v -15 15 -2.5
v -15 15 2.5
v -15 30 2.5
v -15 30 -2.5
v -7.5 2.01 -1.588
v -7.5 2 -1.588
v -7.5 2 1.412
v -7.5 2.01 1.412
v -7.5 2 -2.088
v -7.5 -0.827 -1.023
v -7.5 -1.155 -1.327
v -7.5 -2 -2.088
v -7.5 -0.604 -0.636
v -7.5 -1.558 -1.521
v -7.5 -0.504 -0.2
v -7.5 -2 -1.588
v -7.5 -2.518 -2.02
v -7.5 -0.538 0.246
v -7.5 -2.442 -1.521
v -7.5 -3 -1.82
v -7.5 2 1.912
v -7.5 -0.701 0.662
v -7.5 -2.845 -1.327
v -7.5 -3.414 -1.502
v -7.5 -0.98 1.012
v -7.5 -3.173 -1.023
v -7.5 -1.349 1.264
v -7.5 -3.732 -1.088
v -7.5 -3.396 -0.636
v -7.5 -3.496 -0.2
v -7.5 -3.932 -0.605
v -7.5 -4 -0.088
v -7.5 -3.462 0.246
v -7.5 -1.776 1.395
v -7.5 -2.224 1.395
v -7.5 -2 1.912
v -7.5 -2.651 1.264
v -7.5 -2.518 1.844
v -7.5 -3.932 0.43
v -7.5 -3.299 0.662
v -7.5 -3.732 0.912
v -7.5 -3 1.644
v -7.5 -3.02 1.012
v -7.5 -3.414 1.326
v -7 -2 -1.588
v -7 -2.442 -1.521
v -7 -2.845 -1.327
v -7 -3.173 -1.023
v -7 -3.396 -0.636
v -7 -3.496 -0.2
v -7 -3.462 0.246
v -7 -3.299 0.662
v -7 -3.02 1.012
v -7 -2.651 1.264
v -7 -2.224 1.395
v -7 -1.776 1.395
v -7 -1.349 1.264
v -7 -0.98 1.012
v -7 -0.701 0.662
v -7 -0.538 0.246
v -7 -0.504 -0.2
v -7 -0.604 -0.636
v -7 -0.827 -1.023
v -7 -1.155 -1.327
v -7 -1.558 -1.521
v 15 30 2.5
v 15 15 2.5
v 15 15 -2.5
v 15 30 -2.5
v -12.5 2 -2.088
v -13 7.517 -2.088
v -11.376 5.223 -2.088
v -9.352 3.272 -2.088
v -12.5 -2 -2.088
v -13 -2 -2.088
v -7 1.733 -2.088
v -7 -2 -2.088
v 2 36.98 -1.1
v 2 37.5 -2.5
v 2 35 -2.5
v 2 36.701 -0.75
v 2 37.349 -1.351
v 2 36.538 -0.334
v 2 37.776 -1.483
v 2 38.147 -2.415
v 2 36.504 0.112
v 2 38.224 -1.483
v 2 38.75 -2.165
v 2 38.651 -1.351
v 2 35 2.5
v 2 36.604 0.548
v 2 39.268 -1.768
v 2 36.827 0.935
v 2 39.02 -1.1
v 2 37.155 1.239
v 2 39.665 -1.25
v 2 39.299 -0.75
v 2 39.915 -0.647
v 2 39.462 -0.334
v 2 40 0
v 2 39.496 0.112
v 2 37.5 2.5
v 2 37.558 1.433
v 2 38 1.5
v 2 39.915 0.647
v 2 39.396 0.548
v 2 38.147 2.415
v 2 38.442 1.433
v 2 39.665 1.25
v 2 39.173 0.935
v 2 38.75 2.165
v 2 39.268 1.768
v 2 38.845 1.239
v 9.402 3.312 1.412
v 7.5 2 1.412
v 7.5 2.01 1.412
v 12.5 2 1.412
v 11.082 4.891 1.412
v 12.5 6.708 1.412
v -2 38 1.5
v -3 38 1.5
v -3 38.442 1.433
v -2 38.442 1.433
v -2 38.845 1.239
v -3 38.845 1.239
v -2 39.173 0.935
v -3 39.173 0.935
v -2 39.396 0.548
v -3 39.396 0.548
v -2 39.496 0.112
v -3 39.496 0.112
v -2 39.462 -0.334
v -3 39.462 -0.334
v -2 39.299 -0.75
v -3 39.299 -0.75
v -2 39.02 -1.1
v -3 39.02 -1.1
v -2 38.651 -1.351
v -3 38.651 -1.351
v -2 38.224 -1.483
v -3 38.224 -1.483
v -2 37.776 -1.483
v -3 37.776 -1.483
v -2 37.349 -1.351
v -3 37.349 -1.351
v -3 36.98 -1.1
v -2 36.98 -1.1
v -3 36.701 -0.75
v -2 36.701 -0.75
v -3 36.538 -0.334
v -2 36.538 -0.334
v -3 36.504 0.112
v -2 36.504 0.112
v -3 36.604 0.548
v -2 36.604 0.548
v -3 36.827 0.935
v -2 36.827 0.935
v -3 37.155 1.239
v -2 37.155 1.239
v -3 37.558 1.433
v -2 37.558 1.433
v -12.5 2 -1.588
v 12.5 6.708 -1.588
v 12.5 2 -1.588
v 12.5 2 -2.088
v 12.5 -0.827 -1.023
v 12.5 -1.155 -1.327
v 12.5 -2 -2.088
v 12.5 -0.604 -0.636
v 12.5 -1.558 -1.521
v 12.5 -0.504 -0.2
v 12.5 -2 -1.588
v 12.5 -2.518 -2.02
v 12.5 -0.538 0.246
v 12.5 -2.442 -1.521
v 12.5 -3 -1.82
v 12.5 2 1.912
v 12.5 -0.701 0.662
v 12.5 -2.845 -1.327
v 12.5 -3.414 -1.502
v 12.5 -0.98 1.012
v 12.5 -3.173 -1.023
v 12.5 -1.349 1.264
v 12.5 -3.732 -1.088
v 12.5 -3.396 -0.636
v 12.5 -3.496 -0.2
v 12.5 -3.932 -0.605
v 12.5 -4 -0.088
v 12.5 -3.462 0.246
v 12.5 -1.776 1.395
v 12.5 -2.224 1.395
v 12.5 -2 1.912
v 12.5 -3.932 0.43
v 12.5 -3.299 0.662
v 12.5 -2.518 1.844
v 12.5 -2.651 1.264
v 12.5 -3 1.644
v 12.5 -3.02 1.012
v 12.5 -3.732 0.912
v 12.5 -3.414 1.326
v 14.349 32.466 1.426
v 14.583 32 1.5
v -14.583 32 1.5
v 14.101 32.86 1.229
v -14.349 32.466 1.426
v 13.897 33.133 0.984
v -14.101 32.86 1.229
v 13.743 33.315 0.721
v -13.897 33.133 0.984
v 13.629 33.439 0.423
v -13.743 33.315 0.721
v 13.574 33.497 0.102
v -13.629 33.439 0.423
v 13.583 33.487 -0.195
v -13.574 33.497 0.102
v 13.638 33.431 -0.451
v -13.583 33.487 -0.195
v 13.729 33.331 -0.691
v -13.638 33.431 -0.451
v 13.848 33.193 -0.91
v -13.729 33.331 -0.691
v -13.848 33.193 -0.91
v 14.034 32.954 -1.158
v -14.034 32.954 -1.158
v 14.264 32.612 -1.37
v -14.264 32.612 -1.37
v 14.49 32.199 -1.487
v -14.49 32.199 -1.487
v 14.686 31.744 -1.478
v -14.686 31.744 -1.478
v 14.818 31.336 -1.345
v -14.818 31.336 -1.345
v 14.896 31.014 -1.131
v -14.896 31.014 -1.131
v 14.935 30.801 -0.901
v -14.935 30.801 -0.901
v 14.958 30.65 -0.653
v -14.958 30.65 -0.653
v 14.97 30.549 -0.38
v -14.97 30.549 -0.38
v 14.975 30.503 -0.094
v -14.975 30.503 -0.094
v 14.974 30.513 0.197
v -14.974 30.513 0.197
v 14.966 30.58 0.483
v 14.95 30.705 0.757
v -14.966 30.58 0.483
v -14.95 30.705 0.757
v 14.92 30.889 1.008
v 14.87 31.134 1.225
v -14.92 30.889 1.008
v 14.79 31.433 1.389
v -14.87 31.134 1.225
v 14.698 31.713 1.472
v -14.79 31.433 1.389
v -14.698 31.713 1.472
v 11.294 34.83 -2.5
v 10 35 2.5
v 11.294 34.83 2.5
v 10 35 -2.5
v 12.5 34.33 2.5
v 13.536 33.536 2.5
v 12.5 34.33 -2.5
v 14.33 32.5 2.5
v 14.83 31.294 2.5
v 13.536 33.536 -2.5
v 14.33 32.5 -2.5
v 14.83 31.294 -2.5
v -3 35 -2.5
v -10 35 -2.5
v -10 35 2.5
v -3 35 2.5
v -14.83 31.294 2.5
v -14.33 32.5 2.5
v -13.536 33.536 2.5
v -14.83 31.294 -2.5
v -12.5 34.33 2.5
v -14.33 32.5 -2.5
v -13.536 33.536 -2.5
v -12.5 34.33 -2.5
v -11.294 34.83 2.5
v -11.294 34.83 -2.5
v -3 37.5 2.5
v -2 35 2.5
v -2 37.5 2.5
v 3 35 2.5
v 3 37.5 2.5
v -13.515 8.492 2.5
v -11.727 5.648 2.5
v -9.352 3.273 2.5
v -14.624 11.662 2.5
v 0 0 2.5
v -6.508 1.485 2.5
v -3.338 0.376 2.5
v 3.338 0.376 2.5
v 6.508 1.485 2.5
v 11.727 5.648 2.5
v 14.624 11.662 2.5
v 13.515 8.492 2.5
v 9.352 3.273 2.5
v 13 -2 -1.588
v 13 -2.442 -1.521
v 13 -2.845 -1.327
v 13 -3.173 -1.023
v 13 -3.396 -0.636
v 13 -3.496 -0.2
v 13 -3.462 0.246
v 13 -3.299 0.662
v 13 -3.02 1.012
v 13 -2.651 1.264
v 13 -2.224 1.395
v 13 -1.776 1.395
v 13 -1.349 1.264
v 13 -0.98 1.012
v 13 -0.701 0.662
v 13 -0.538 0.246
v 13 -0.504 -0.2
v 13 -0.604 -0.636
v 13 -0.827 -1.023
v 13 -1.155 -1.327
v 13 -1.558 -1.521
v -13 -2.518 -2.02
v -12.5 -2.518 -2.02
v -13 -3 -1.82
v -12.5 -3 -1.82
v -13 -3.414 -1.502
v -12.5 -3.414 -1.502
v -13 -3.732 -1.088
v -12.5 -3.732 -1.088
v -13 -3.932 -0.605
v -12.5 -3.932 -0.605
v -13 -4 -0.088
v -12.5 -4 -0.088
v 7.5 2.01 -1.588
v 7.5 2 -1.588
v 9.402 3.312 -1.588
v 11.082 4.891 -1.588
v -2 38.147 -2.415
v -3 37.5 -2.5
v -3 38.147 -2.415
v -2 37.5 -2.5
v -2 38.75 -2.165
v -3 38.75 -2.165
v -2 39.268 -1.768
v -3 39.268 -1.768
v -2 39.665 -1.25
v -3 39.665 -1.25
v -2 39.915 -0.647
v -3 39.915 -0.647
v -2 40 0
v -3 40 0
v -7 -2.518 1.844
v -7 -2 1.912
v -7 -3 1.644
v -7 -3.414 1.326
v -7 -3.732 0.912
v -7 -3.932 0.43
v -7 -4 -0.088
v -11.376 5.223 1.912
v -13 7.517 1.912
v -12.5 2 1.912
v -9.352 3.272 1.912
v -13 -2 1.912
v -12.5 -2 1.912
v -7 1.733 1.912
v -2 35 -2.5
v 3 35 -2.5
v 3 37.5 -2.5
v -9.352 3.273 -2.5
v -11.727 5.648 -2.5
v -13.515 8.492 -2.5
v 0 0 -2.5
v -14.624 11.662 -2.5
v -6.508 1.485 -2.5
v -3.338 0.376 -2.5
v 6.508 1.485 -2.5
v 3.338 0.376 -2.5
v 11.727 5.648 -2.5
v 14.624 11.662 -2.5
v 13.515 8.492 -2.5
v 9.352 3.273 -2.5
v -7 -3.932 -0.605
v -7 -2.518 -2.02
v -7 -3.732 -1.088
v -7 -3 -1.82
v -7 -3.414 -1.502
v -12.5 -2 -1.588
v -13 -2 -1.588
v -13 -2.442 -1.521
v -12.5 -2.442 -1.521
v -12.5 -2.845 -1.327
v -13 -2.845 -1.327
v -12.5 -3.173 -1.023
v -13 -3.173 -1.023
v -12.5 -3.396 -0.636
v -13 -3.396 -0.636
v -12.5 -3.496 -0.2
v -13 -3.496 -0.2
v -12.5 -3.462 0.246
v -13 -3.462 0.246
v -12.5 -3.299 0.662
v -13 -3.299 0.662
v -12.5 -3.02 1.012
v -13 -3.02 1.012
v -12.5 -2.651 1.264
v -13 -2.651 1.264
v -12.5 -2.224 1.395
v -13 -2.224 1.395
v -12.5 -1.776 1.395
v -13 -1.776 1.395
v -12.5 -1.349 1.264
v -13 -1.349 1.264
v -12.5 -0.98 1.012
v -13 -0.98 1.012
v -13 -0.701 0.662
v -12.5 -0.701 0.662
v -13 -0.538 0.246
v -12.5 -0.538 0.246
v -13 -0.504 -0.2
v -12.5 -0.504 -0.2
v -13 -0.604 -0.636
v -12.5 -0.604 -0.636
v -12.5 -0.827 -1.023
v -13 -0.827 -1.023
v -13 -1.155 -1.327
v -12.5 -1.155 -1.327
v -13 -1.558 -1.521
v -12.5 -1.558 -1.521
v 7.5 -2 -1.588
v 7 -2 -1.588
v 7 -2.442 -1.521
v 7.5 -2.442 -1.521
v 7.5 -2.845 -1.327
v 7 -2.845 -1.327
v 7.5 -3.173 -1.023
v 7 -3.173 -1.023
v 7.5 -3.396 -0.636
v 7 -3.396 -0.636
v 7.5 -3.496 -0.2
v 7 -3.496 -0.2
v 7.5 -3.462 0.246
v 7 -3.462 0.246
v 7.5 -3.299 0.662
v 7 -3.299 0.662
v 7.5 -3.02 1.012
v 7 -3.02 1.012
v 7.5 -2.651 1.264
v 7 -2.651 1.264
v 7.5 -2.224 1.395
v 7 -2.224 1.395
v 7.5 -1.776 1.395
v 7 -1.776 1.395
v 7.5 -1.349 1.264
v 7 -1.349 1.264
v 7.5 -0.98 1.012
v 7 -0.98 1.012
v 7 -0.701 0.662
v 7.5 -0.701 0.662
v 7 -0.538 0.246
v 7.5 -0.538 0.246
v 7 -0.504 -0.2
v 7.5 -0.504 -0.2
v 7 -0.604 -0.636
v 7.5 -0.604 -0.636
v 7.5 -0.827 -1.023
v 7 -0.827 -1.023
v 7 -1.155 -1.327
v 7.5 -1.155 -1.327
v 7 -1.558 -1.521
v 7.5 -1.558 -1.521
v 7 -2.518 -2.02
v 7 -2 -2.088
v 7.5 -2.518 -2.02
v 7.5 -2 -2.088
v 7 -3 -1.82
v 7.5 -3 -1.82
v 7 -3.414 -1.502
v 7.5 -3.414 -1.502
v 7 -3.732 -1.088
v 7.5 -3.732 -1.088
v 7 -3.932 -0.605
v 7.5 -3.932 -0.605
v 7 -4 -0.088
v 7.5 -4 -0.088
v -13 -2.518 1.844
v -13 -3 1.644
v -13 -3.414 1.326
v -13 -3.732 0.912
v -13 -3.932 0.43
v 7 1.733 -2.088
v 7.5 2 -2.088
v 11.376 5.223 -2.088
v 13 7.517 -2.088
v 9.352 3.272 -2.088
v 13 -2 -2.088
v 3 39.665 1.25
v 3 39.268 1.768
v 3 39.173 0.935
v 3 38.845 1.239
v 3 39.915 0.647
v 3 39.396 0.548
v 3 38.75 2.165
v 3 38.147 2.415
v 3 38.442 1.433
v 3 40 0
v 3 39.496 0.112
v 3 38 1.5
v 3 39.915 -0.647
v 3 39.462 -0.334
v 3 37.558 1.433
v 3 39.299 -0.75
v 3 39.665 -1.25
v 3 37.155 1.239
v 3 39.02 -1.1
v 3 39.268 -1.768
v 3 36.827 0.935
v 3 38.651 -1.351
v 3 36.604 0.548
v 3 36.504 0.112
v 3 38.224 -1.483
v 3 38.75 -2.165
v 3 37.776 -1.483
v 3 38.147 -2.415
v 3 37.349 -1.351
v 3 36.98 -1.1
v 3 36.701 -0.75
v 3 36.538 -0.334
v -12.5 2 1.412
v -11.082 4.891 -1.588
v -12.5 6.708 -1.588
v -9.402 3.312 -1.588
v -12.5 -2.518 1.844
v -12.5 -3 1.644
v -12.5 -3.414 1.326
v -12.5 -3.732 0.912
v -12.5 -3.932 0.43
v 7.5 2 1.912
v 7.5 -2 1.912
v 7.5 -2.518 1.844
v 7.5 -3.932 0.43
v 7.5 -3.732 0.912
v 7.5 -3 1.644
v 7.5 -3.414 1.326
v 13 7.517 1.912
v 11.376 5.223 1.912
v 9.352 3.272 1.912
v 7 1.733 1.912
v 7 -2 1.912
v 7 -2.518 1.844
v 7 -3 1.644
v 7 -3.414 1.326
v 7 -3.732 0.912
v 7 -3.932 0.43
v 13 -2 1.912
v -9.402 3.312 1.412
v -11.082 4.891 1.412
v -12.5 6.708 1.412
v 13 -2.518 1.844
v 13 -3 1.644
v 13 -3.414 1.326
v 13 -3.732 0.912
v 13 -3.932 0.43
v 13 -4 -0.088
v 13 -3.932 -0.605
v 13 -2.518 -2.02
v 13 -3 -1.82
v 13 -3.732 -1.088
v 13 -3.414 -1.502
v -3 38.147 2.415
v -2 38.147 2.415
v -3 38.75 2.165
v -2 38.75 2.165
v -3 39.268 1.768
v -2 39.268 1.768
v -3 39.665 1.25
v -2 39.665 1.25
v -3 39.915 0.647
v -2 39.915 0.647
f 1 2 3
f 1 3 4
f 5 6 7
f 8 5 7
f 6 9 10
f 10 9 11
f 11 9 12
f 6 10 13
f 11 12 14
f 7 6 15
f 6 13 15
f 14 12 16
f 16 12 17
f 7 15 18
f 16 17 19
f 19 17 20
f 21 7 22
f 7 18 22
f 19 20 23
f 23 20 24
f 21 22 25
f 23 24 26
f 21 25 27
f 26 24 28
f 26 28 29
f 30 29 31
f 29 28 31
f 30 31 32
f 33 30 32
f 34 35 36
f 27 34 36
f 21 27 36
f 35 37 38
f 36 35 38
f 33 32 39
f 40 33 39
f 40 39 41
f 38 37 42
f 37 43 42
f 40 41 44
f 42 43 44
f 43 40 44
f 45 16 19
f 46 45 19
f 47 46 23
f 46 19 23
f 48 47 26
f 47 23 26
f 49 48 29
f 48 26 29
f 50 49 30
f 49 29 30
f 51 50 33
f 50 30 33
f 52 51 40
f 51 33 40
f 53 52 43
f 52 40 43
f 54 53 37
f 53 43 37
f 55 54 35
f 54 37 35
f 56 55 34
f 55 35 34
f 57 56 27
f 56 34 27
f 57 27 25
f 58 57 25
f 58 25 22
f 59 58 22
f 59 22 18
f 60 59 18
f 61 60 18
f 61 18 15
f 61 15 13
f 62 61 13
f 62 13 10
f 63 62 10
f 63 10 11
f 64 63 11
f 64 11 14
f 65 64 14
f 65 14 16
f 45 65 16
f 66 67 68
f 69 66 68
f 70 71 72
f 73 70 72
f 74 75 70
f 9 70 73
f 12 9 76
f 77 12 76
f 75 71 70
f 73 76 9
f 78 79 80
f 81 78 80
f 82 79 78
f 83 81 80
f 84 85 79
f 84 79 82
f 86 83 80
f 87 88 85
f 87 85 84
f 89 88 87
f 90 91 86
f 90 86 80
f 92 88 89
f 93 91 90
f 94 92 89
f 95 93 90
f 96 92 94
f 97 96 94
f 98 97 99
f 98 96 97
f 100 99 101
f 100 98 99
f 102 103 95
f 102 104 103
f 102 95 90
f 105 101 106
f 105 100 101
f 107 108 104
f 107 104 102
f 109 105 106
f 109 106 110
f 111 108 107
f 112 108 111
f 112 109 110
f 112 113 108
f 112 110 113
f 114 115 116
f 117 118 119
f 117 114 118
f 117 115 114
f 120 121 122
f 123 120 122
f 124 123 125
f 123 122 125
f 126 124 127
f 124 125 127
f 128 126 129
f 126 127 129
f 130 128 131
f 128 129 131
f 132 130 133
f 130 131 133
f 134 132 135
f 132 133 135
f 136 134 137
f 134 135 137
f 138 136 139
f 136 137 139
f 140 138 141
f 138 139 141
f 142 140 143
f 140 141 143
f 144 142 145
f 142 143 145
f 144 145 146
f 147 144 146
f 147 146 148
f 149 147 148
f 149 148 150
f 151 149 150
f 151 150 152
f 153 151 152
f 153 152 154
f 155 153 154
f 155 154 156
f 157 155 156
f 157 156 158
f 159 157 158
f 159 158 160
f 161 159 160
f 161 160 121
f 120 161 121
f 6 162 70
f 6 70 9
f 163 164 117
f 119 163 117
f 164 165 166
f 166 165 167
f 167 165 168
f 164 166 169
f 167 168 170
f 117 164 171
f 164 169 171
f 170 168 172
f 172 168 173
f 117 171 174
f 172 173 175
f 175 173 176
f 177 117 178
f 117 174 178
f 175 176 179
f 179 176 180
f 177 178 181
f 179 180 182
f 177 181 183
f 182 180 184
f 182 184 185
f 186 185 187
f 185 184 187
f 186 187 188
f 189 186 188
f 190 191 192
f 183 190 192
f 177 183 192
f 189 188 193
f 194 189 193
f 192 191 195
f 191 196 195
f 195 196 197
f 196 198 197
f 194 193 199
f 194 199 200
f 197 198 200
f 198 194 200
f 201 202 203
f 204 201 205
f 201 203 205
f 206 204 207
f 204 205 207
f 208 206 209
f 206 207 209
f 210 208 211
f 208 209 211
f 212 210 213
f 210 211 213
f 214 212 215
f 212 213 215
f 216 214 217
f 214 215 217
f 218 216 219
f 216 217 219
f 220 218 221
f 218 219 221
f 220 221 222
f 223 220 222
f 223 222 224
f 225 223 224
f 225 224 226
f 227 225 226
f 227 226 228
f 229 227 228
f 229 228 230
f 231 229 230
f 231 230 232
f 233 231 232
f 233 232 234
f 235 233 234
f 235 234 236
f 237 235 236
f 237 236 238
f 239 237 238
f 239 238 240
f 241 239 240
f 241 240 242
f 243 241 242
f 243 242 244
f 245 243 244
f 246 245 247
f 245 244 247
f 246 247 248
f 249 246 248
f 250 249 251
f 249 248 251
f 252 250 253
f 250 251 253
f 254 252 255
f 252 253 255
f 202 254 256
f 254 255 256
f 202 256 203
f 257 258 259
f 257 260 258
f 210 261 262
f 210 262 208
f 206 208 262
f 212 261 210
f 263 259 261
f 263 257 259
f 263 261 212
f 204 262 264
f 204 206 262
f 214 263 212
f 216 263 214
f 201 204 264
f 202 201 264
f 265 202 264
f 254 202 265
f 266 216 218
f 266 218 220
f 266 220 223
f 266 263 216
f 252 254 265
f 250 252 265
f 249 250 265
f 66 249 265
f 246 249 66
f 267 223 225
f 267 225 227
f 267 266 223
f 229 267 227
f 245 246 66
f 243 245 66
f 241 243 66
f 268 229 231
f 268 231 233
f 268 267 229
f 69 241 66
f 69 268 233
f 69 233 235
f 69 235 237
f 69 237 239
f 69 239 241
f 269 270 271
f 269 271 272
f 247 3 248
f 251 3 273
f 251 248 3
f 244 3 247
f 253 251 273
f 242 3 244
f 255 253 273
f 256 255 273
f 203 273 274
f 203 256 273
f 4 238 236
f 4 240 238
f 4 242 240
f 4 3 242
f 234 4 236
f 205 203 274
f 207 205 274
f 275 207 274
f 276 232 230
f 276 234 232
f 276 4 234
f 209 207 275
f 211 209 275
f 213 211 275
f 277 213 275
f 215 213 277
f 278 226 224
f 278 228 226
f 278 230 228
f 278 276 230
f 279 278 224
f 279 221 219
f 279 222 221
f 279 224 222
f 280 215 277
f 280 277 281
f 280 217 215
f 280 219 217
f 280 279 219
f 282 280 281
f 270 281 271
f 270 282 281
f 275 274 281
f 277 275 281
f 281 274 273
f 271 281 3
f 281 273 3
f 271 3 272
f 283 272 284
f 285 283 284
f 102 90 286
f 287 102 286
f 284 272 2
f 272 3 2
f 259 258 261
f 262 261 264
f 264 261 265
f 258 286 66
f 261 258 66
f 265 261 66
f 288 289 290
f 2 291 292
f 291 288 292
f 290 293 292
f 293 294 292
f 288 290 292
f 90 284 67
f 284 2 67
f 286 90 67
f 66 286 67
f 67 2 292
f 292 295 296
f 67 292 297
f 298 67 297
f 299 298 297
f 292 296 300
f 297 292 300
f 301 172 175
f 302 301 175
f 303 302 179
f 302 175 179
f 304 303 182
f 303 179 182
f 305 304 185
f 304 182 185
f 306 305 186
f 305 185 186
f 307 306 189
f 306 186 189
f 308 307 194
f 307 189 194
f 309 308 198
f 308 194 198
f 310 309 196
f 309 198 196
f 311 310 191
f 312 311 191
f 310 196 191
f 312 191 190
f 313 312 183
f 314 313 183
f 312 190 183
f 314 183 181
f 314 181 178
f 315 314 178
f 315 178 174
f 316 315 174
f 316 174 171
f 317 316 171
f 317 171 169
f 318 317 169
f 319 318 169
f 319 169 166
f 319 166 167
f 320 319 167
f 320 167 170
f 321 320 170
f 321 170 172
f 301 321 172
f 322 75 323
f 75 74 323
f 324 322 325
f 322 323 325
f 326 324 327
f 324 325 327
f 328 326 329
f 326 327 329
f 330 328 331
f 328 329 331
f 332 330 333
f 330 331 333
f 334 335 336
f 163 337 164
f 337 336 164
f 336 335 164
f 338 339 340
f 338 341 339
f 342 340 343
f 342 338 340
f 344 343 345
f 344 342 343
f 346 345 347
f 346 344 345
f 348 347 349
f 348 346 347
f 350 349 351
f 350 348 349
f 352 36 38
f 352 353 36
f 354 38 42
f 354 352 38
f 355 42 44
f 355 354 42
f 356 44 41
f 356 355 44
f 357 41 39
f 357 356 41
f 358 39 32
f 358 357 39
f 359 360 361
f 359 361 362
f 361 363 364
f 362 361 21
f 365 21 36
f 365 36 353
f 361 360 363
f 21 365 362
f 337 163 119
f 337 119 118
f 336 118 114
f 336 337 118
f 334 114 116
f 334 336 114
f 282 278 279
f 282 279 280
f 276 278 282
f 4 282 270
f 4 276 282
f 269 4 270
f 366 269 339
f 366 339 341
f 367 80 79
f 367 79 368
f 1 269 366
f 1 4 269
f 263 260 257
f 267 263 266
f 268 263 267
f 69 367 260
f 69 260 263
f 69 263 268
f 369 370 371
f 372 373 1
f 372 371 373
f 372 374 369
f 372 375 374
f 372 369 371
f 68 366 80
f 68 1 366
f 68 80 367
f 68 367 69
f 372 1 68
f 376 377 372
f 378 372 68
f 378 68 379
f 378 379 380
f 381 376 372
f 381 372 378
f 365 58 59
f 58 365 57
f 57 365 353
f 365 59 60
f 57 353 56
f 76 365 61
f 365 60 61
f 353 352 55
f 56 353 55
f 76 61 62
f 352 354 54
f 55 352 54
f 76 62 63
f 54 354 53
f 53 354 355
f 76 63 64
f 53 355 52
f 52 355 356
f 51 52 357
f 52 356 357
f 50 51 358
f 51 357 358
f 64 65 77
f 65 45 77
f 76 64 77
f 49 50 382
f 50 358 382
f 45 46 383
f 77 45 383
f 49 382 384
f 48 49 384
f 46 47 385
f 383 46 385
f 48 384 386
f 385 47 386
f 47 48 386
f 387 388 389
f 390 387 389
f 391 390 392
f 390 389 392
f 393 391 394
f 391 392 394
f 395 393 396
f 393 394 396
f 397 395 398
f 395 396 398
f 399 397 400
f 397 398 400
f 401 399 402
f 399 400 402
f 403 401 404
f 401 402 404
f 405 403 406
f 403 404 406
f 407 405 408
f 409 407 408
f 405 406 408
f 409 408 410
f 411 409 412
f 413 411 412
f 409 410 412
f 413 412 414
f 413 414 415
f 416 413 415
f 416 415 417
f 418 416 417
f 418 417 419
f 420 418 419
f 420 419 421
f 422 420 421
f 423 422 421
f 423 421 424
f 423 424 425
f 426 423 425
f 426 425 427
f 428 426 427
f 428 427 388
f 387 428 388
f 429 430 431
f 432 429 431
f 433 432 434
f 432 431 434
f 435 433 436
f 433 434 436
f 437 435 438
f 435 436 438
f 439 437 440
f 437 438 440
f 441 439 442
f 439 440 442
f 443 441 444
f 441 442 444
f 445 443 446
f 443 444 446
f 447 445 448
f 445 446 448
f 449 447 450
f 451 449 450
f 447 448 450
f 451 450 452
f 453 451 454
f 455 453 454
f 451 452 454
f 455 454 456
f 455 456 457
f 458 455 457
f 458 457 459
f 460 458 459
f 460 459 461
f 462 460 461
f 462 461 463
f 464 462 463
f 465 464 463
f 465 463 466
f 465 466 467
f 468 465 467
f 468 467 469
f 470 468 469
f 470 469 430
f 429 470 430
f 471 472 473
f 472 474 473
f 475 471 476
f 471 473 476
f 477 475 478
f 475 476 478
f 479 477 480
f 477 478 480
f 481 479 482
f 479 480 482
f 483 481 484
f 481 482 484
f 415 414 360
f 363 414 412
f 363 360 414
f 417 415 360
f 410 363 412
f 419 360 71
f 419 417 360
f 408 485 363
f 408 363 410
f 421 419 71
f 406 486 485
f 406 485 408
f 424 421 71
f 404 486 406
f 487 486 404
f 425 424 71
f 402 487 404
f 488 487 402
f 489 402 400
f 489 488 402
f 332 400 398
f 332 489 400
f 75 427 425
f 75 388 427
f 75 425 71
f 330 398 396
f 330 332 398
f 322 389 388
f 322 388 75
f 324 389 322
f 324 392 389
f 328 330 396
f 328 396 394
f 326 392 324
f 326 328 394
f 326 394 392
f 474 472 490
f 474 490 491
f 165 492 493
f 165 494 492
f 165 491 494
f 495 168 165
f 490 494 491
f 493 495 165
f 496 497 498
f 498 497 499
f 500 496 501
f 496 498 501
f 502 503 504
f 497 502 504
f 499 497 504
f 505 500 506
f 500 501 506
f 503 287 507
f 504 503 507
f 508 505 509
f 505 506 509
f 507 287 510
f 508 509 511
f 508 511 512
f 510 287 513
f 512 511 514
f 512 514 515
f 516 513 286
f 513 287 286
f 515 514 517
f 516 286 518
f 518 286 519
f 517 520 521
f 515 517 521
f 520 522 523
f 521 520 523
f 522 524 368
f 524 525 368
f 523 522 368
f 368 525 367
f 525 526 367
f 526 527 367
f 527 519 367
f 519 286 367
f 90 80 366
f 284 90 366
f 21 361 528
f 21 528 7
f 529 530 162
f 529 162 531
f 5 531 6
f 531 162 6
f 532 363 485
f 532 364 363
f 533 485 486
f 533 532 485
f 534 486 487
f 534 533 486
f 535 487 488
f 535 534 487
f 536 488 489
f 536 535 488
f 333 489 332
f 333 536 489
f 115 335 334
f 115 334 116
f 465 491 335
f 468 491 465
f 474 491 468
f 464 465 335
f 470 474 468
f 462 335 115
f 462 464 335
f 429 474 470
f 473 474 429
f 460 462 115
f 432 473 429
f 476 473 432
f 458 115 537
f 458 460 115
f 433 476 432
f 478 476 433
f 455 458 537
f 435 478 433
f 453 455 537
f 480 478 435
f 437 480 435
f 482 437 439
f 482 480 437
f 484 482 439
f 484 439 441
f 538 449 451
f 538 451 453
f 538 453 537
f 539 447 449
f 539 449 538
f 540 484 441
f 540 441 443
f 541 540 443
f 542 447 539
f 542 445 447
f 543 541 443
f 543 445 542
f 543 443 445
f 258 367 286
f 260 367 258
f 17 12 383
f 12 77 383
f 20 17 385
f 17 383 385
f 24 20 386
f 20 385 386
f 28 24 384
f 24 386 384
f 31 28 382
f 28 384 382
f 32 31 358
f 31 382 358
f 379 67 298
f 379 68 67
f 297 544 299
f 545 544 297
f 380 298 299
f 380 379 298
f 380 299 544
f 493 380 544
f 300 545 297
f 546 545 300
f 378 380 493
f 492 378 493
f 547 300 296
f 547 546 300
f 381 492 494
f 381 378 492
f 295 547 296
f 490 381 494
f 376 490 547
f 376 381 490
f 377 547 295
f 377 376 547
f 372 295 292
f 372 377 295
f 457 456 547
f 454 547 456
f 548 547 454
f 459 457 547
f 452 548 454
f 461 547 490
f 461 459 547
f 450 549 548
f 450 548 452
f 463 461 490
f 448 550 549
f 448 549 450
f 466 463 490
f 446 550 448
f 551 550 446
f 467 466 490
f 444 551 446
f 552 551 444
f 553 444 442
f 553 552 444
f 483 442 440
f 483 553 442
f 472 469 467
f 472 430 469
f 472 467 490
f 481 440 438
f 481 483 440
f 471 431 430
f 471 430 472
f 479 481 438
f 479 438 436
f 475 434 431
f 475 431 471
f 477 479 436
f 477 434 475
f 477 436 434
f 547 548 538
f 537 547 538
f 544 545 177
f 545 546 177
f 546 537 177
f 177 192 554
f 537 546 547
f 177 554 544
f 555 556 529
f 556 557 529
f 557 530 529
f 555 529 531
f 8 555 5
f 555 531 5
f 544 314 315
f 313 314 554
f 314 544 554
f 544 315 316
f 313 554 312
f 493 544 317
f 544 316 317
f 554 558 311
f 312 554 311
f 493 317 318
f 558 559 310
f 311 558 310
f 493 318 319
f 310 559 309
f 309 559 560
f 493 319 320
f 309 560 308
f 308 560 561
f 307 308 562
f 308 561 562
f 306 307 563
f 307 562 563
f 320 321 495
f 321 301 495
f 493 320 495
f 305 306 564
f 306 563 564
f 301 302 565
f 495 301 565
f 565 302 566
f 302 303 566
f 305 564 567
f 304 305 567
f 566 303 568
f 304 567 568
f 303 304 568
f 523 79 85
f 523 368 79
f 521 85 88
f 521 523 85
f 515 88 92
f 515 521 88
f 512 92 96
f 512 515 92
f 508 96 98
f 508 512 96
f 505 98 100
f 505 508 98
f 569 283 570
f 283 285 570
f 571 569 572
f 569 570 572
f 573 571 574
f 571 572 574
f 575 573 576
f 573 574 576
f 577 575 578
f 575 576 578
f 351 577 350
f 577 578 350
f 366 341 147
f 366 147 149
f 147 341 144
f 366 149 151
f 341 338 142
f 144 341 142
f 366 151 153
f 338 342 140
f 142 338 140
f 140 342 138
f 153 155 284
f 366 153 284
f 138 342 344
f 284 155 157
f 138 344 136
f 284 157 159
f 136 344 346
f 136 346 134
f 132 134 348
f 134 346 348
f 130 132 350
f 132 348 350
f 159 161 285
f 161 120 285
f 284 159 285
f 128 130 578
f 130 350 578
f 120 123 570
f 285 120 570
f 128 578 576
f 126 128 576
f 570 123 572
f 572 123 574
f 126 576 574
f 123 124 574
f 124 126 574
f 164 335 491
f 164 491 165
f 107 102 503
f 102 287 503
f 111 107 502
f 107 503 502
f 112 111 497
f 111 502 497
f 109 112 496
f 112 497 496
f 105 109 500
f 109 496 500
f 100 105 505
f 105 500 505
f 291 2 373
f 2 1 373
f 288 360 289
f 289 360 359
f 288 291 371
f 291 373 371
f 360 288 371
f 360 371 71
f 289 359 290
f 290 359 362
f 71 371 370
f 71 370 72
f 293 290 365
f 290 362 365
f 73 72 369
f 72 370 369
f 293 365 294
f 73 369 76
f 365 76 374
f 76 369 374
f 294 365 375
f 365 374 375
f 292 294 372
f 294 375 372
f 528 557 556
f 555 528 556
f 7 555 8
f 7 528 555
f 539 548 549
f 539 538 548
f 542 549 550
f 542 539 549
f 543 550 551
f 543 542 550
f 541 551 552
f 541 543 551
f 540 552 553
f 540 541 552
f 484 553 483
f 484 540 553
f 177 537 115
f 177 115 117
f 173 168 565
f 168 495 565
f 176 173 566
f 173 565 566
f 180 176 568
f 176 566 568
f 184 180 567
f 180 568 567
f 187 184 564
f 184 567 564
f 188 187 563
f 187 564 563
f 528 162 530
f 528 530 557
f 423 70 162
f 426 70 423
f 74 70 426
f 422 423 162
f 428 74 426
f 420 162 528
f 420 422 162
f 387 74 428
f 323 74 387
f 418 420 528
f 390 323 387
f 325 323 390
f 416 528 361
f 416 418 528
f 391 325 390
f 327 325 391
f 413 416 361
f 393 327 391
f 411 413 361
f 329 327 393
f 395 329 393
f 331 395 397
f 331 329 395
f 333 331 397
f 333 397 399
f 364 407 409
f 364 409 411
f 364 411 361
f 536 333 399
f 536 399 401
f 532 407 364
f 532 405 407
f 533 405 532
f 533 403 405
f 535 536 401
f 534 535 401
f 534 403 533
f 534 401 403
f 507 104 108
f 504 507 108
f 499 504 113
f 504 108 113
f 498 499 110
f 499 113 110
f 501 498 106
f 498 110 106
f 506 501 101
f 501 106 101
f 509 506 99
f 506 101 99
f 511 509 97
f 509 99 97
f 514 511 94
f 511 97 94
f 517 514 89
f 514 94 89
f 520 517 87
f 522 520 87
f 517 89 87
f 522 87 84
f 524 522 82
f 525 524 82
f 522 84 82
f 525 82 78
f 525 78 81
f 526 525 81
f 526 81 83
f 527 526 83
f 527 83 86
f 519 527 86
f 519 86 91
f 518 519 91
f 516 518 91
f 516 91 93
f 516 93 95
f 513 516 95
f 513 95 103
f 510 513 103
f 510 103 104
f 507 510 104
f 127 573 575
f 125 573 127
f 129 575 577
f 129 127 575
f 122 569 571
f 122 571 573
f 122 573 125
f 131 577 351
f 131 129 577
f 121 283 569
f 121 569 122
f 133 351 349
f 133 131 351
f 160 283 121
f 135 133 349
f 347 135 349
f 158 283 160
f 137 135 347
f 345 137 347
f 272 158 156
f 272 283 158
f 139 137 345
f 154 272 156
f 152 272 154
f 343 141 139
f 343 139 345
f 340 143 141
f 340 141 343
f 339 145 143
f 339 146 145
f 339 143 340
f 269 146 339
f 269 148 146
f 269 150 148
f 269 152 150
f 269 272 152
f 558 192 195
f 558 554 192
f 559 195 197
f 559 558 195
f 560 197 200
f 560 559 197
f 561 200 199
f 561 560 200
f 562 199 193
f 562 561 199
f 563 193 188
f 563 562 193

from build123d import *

# Parameters (mm, degrees)
SKETCH1_W                = 30
SKETCH1_H                = 5
BOSS_EXTRUDE1_DEPTH      = 35
FILLET1_R                = 15
FILLET3_R                = 5
SKETCH4_R                = 1.5
CUT_EXTRUDE1_DEPTH       = 35
SKETCH5_W                = 6
SKETCH5_H                = 5
SKETCH5_W_2              = 4
SKETCH5_H_2              = 3
BOSS_EXTRUDE2_DEPTH      = 5
CUT_EXTRUDE2_DEPTH       = 5
SKETCH7_R                = 1.5
CUT_EXTRUDE3_DEPTH       = 15
FILLET4_R                = 2.5
BOSS_EXTRUDE3_DEPTH      = 8
BOSS_EXTRUDE3_DEPTH_BACK = 4
SKETCH8_W                = 6
SKETCH8_H                = 4
SKETCH8_W_2              = 5
SKETCH8_H_2              = 3
SKETCH9_W                = 5
SKETCH9_H                = 4.517478875
CUT_EXTRUDE4_DEPTH       = 6
SKETCH10_R               = 1.5
CUT_EXTRUDE5_DEPTH       = 36
FILLET5_R                = 2
FILLET6_R                = 2


with BuildPart() as part:
    # Sketch1 → Boss-Extrude1 (new body)
    with BuildSketch(Plane(origin=(0, 0, 0), x_dir=(1, 0, 0), z_dir=(0, 1, 0))):
        Rectangle(SKETCH1_W, SKETCH1_H)
    extrude(amount=BOSS_EXTRUDE1_DEPTH)

    # Fillet1
    fillet1_edges = [part.edges().sort_by_distance(p)[0] for p in [
        (15, 0, 0),
        (-15, 0, 0),
    ]]
    fillet(fillet1_edges, radius=FILLET1_R - 0.0001)  # a hair under: the kernel refuses the full size

    # Fillet3
    fillet3_edges = [part.edges().sort_by_distance(p)[0] for p in [
        (15, 35, 0),
        (-15, 35, 0),
    ]]
    fillet(fillet3_edges, radius=FILLET3_R)

    # Sketch4 → Cut-Extrude1 (cut)
    with BuildSketch(Plane.ZY.offset(15)):
        with Locations((0, 32)):
            Circle(SKETCH4_R)
    extrude(amount=-CUT_EXTRUDE1_DEPTH, mode=Mode.SUBTRACT)

    # Sketch5 → Boss-Extrude2 (add)
    with BuildSketch(Plane(origin=(0, 35, 0), x_dir=(1, 0, 0), z_dir=(0, 1, 0))):
        Rectangle(SKETCH5_W, SKETCH5_H)
        Rectangle(SKETCH5_W_2, SKETCH5_H_2, mode=Mode.SUBTRACT)
    extrude(amount=BOSS_EXTRUDE2_DEPTH)

    # Sketch6 → Cut-Extrude2 (cut)
    with BuildSketch(Plane(origin=(0, 40, 0), x_dir=(1, 0, 0), z_dir=(0, 1, 0))):
        Polygon((-2, 1.5), (-2, 3.860545562), (2, 3.860545562), (2, -3.417925007), (-2, -3.417925007), align=None)
    extrude(amount=-CUT_EXTRUDE2_DEPTH, mode=Mode.SUBTRACT)

    # Sketch7 → Cut-Extrude3 (cut)
    with BuildSketch(Plane.ZY.offset(3)):
        with Locations((0, 38)):
            Circle(SKETCH7_R)
    extrude(amount=-CUT_EXTRUDE3_DEPTH, mode=Mode.SUBTRACT)

    # Fillet4
    fillet4_edges = [part.edges().sort_by_distance(p)[0] for p in [
        (-2.5, 40, 2.5),
        (-2.5, 40, -2.5),
        (2.5, 40, 2.5),
        (2.5, 40, -2.5),
    ]]
    fillet(fillet4_edges, radius=FILLET4_R - 0.0001)  # a hair under: the kernel refuses the full size

    # Sketch8 → Boss-Extrude3 (add, two sides: drawn at the far end of the back side and taken through both)
    # profile 1 of 2: a face of its own
    with BuildSketch(Plane(origin=(0, 0, 0), x_dir=(1, 0, 0), z_dir=(0, 1, 0)).offset(-BOSS_EXTRUDE3_DEPTH_BACK)):
        with Locations((-10, 0.087771821)):
            Rectangle(SKETCH8_W, SKETCH8_H)
        with Locations((-10, 0.087771821)):
            Rectangle(SKETCH8_W_2, SKETCH8_H_2, mode=Mode.SUBTRACT)
    # profile 2 of 2: a face of its own
    with BuildSketch(Plane(origin=(0, 0, 0), x_dir=(1, 0, 0), z_dir=(0, 1, 0)).offset(-BOSS_EXTRUDE3_DEPTH_BACK)):
        with Locations((10, 0.087771821)):
            Rectangle(SKETCH8_W, SKETCH8_H)
        with Locations((10, 0.087771821)):
            Rectangle(SKETCH8_W_2, SKETCH8_H_2, mode=Mode.SUBTRACT)
    extrude(amount=BOSS_EXTRUDE3_DEPTH + BOSS_EXTRUDE3_DEPTH_BACK)

    # Sketch9 → Cut-Extrude4 (cut)
    with BuildSketch(Plane.XZ.offset(4)):
        with Locations((-10, -0.111234663)):
            Rectangle(SKETCH9_W, SKETCH9_H)
        with Locations((10, -0.111234663)):
            Rectangle(SKETCH9_W, SKETCH9_H)
    extrude(amount=-CUT_EXTRUDE4_DEPTH, mode=Mode.SUBTRACT)

    # Sketch10 → Cut-Extrude5 (cut)
    with BuildSketch(Plane.ZY.offset(13)):
        with Locations(Location((-0.087771821, -2, 0), (0, 0, 180))):
            Circle(SKETCH10_R)
    extrude(amount=-CUT_EXTRUDE5_DEPTH, mode=Mode.SUBTRACT)

    # Fillet5
    fillet5_edges = [part.edges().sort_by_distance(p)[0] for p in [
        (7.25, -4, -2.087771821),
        (7.25, -4, 1.912228179),
        (12.75, -4, 1.912228179),
        (12.75, -4, -2.087771821),
    ]]
    fillet(fillet5_edges, radius=FILLET5_R - 0.0001)  # a hair under: the kernel refuses the full size

    # Fillet6
    fillet6_edges = [part.edges().sort_by_distance(p)[0] for p in [
        (-7.25, -4, 1.912228179),
        (-12.75, -4, 1.912228179),
        (-12.75, -4, -2.087771821),
        (-7.25, -4, -2.087771821),
    ]]
    fillet(fillet6_edges, radius=FILLET6_R - 0.0001)  # a hair under: the kernel refuses the full size


solid = part.part
